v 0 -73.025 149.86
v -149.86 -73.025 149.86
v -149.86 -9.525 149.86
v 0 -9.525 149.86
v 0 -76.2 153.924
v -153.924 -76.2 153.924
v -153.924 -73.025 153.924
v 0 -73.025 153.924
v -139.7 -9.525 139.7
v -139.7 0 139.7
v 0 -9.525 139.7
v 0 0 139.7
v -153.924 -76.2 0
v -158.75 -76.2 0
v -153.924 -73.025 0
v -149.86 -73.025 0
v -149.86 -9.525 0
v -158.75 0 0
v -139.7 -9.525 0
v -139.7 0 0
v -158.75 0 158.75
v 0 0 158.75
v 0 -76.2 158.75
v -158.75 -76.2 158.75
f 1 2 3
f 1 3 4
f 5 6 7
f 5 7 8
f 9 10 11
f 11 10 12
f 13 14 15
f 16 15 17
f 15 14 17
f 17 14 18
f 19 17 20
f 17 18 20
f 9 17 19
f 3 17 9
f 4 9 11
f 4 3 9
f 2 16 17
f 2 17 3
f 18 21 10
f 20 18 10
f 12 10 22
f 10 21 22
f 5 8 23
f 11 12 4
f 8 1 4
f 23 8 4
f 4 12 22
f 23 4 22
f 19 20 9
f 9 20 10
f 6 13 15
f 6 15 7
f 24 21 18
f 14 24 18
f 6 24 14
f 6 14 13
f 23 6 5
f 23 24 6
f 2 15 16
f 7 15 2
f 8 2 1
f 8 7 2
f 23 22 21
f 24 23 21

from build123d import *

# Parameters (mm, degrees)
F1_DEPTH = 76.2
F2_W     = 153.924
F2_H     = 153.924
F3_DEPTH = 3.175
F4_W     = 149.86
F4_H     = 149.86
F5_DEPTH = 63.5


# Not quite as in the source:
# - a feature names something its author has since deleted; it is built from what else it names


with BuildPart() as f1:
    # F0 (on Front) → F1 (new body)
    with BuildSketch(Plane.XZ):
        Polygon((0, 139.7), (0, 158.75), (-158.75, 158.75), (-158.75, 0), (-139.7, 0), (-139.7, 139.7), align=None)
    extrude(amount=F1_DEPTH)

    # F2 (on face) → F3 (cut)
    with BuildSketch(Plane.XZ.offset(76.2)):
        with Locations((-76.962, 76.962)):
            Rectangle(F2_W, F2_H)
    extrude(amount=-F3_DEPTH, mode=Mode.SUBTRACT)

    # F4 (on face) → F5 (cut)
    with BuildSketch(Plane.XZ.offset(73.025)):
        with Locations((-74.93, 74.93)):
            Rectangle(F4_W, F4_H)
    extrude(amount=-F5_DEPTH, mode=Mode.SUBTRACT)


solid = f1.part
